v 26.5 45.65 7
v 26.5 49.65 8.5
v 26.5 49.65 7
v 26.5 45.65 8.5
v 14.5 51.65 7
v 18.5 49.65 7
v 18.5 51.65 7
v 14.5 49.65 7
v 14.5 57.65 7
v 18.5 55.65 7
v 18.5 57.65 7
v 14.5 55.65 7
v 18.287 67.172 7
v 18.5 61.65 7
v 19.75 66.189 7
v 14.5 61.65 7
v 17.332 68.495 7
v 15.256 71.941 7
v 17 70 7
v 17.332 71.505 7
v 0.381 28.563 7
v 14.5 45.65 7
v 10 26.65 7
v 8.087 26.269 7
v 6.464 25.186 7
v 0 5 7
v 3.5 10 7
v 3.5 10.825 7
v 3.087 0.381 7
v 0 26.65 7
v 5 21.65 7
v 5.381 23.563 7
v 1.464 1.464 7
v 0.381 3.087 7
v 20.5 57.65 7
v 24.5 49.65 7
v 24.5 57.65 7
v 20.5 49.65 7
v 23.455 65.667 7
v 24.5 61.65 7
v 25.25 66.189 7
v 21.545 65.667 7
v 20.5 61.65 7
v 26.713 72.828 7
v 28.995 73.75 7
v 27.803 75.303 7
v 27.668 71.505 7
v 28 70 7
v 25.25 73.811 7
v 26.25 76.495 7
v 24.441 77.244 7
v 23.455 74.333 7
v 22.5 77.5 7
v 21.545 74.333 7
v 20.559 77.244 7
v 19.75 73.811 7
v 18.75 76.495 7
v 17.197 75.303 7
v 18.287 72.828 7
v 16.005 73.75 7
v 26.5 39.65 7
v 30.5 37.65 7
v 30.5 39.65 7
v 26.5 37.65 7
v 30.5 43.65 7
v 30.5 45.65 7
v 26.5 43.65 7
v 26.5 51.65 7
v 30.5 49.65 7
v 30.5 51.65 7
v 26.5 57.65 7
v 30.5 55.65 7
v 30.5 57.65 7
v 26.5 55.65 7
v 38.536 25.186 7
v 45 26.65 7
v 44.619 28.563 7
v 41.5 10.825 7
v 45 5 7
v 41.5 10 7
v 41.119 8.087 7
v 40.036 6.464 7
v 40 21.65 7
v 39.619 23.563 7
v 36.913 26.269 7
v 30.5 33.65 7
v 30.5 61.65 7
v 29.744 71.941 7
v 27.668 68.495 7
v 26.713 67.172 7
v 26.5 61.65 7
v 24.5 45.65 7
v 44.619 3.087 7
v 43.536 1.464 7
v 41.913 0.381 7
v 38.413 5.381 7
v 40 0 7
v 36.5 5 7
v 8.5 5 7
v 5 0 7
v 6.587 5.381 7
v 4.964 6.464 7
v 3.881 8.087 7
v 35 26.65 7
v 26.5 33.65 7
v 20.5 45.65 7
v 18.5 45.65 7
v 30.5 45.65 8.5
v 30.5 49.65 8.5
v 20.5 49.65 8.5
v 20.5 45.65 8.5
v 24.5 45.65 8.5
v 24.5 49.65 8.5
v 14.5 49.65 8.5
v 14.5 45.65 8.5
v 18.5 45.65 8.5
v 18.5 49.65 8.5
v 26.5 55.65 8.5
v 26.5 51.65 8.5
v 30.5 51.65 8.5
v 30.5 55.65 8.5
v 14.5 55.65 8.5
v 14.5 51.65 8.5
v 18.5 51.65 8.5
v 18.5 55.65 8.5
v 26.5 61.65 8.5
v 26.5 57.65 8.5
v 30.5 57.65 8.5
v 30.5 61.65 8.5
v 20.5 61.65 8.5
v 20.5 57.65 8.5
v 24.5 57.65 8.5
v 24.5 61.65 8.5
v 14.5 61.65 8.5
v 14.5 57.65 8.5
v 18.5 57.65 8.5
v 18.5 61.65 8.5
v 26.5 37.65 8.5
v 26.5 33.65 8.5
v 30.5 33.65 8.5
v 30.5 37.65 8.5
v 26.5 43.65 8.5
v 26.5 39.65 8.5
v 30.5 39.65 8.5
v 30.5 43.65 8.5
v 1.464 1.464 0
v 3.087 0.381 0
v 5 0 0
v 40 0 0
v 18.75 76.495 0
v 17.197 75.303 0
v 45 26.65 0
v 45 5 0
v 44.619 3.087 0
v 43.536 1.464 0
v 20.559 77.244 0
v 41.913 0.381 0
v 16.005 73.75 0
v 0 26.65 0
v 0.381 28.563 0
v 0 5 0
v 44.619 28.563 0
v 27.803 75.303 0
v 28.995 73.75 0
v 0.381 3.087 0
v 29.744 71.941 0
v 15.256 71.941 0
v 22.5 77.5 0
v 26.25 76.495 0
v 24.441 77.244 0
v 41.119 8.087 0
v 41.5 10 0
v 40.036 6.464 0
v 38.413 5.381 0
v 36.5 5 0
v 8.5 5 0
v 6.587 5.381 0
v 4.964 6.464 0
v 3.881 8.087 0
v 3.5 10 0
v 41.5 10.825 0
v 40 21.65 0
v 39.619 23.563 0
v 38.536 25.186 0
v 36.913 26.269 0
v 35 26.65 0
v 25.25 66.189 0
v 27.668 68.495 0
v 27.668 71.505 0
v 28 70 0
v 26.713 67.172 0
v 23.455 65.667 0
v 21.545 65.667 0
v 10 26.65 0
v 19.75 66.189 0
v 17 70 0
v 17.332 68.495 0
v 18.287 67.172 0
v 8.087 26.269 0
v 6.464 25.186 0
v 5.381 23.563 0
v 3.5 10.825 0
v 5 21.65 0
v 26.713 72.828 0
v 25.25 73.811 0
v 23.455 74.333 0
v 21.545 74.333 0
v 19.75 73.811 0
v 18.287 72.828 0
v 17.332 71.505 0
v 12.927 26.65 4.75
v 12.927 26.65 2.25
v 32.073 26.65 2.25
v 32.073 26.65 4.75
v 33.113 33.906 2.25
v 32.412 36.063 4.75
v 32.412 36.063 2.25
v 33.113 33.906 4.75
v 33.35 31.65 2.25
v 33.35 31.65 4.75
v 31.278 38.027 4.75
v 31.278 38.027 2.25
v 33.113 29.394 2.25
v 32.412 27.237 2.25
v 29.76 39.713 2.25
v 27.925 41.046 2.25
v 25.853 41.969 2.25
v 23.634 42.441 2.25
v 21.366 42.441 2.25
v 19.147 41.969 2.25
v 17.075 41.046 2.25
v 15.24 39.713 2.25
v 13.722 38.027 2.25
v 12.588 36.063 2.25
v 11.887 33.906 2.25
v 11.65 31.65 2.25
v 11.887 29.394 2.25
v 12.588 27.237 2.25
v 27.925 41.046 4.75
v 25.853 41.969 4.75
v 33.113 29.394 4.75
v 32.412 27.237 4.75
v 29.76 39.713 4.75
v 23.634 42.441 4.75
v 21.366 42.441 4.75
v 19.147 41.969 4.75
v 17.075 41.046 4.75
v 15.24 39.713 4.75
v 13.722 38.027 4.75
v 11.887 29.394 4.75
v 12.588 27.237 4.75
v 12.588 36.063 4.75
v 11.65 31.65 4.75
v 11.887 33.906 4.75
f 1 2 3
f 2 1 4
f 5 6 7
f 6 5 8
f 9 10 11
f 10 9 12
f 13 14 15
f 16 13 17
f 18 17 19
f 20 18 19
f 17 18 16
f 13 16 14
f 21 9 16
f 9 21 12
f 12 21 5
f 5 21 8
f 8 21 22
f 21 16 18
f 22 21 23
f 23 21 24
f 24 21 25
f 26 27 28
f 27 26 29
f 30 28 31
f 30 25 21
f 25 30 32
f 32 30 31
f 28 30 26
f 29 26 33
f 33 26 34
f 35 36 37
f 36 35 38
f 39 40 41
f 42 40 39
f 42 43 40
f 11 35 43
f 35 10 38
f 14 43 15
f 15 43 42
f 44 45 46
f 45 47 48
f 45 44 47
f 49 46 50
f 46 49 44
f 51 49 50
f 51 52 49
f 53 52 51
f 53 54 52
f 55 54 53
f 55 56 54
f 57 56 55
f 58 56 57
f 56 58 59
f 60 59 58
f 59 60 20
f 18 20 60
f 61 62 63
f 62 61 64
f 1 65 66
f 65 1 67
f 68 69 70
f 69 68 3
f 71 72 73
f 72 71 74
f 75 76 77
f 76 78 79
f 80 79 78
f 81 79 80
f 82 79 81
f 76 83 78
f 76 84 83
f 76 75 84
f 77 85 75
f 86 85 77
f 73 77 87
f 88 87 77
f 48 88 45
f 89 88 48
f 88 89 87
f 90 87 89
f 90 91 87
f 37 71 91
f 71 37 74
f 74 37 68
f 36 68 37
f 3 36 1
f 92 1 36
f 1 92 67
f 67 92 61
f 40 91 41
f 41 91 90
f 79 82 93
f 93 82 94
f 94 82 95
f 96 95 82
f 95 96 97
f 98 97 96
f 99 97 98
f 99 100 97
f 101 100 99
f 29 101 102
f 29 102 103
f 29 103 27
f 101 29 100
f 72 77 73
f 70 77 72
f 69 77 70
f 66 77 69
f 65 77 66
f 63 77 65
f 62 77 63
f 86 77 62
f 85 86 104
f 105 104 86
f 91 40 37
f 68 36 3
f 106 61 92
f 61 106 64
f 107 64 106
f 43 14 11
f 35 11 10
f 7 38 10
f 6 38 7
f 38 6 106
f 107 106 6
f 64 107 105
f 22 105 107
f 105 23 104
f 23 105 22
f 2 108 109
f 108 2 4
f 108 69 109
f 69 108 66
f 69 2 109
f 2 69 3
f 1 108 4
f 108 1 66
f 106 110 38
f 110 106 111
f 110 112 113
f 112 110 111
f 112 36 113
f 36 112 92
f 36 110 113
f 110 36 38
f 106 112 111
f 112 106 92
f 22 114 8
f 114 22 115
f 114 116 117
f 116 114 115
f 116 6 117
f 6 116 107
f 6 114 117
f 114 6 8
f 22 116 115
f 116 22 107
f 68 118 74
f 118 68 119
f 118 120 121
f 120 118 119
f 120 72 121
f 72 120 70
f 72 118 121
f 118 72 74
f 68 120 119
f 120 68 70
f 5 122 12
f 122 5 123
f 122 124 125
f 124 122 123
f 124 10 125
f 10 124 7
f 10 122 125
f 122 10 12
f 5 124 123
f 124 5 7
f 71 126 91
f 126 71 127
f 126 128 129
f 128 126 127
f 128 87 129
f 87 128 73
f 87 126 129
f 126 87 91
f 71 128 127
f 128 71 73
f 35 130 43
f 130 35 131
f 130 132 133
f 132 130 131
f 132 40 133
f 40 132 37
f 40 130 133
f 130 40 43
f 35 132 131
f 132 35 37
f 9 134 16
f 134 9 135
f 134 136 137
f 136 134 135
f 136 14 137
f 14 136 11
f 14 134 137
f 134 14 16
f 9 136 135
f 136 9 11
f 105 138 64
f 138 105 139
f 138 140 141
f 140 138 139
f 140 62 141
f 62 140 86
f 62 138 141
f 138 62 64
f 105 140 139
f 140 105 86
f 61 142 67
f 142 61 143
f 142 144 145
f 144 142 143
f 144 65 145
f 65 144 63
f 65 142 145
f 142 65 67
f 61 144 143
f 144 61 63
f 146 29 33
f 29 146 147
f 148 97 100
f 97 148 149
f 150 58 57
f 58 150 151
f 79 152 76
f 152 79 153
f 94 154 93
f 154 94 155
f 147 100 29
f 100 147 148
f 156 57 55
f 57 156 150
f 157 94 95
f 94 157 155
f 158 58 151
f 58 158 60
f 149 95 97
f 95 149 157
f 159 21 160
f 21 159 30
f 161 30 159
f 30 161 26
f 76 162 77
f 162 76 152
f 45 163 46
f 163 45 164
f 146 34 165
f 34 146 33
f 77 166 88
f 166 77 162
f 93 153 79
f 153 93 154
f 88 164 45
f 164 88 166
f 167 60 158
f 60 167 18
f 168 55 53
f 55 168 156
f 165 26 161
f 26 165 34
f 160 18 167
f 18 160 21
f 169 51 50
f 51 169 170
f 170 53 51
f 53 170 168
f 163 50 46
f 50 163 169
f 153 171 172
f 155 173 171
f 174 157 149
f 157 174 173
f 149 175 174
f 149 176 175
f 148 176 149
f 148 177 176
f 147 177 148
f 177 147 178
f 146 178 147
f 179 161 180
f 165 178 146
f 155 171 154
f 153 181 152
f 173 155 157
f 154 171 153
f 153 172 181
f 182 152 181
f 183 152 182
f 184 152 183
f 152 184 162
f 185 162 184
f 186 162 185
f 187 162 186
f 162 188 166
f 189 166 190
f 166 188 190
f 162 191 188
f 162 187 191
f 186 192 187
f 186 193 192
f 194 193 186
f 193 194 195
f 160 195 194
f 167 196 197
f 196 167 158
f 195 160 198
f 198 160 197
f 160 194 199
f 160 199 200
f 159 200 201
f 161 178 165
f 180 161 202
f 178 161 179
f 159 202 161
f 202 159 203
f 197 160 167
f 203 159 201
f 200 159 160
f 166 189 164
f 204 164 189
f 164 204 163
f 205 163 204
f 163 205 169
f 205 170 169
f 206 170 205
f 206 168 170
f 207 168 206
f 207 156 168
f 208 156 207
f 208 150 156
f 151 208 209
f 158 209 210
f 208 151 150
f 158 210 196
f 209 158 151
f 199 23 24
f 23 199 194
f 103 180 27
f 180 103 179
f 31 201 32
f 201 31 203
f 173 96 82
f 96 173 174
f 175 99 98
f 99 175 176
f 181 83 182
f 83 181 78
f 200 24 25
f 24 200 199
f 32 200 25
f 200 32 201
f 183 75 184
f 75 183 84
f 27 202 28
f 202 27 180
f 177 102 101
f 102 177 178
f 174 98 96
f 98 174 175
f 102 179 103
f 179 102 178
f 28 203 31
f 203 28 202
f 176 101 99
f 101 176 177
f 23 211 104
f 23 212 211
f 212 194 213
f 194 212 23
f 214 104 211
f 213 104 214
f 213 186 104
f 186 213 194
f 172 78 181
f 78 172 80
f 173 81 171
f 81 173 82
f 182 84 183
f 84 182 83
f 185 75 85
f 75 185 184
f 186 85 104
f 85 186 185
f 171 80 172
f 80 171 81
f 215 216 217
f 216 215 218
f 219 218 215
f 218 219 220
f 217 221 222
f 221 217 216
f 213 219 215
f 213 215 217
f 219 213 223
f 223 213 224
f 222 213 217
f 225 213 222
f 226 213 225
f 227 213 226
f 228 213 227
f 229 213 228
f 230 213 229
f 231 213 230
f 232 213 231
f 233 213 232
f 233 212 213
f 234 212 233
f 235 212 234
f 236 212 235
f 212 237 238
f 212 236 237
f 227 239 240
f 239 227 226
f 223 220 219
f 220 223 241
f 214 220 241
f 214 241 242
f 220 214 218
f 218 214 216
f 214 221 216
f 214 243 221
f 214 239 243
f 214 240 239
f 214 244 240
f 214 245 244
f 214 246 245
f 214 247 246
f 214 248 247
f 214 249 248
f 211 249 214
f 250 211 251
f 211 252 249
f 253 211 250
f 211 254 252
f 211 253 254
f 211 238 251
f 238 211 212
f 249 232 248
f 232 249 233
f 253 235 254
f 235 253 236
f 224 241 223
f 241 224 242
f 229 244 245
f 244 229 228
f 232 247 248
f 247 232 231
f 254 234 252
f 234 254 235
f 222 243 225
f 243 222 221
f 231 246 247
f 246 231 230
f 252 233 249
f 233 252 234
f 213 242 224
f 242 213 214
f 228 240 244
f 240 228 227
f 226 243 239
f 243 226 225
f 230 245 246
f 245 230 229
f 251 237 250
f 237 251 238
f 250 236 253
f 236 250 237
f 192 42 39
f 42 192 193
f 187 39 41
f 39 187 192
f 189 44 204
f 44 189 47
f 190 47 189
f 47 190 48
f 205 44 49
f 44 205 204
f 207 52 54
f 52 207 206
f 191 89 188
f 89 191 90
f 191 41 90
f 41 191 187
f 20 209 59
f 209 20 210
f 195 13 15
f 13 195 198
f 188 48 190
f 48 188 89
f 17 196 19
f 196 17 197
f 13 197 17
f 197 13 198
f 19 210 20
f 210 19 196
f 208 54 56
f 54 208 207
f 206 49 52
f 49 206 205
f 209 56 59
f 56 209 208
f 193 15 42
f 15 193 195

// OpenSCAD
/**
 * Coin bottle opener
 * Designed by Niek Blankers <niek@niekproductions.com>
 * 
 * Set fill to 90-100% for best results.
 * Insert coin during printing!
 * 
 */

/**
 * 5 cent euro coin:
 * Diameter: 21.3
 * Thickness: 1.7
 *
 * 10 cent euro coin:
 * Diameter: 19.8 
 * Thickness: 2.0
 *
 * 20 cent euro coin:
 * Diameter: 22.3
 * Thickness: 2.2
 *
 * 50 cent euro coin:
 * Diameter: 24.3
 * Thickness: 2.4
 * 
 * US penny:
 * Diameter: 19.1
 * Thickness: 1.6
 *
 * US nickel:
 * Diameter: 21.2
 * Thickness: 2.0
 *
 * US dime:
 * Diameter: 17.9
 * Thickness: 1.4
 *
 * US quarter:
 * Diameter: 24.3
 * Thickness: 1.8
 *
 * US 50 cent:
 * Diameter: 30.6
 * Thickness: 2.2
 */

// Coin diameter
coinDiameter = 21.3; // [21.3:0.05 euro, 19.8:0.10 euro, 22.3:0.20 euro, 24.3:0.50 euro, 19.1:US penny, 21.2:US nickel, 17.9:US dime, 24.3:US quarter, 30.6:US 50 cent]

// Coin thickness
coinThickness = 1.7; // [1.7:0.05 euro, 2.0:0.10 euro, 2.2:0.20 euro, 2.4:0.50 euro, 1.6:US penny, 2.0:US nickel, 1.4:US dime, 1.8:US quarter, 2.2:US 50 cent]

// Coin clearance
coinClearance = 0.4;

// Coin offset from center
coinOffset = 5; // [0:10]

// Coin angle
coinAngle = 0; // [0:15]

// Opener width
width=45; // [40:100]

// Opener length
length=85; // [65:100]

// Opener height
height=7; // [5:20]

// Front opener width
frontWidth=45; // [45:105]

// Back opener width
backWidth = 15; // [10:100]

// Edge width
edgeWidth=5; // [2:20]

// Edge round radius
roundRadius=5; // [0:10]

// Logo cube size (WxLxH)
cubeSize = [4,4,1.5];

// Logo cube spacing
cubeSpacing = 6; // [1:10]

// For the Bitmap
bits=[
	[1,0,0],
	[1,0,0],
	[1,1,1],
	[1,0,1],
	[1,1,1]
];

openingWidth=width-(edgeWidth*2);
openingLength=16-coinOffset+coinDiameter/2;
openingHeight=height;
frontOpeningWidth=openingWidth+3;

frontLength = openingLength+edgeWidth*2;

chainHole = backWidth-4; //Keychain hole diameter

module handle(){
		hull(){
				translate([-(frontWidth-width)/2,0,0]) roundedRect([frontWidth,frontLength/2,height], roundRadius);
				translate([0,frontLength/2,0]) roundedRect([width,frontLength/2,height], roundRadius);
				translate([width/2,length-backWidth,height/2]) cylinder(h=height, r=backWidth/2, center=true);
		}
}

module opener(){
	difference(){
		union(){
			handle();
			translate([width/2 + (cubeSpacing*((len(bits[1])-1)/2)),frontLength + (length-frontLength)/((length-frontLength)/cubeSize[1]),height+cubeSize[2]/2]) rotate(a=[0,0,180]) drawBitmap(bits, cubeSpacing, cubeSize);
		}

		translate([(width/2)-(openingWidth/2),edgeWidth,-1]) hull(){
			translate([-(frontOpeningWidth-openingWidth)/2,0,0]) roundedRect([frontOpeningWidth,openingLength/2,openingHeight+2], roundRadius);
			translate([0,openingLength/2,0]) roundedRect([openingWidth,openingLength/2,openingHeight+2], roundRadius);
		}

		translate([width/2,edgeWidth+openingLength+coinOffset,height/2]) rotate(a=-coinAngle,v=[1,0,0]){
			cylinder(h = coinThickness+coinClearance*2, r = (coinDiameter+coinClearance)/2, center = true);
		}

		translate([width/2,length-backWidth,height/2]) scale([1.0,0.8,1.0]) cylinder(h=height+1, r=chainHole/2, center=true);

	}	

}

opener();


module roundedRect(size, radius) { // from http://www.thingiverse.com/thing:9347/#comments
	x = size[0];
	y = size[1];
	z = size[2];
	
	linear_extrude(height=z)
		hull() {
			translate([radius, radius, 0])
			circle(r=radius);
	
			translate([x - radius, radius, 0])
			circle(r=radius);
	
			translate([x - radius, y - radius, 0])
			circle(r=radius);
	
			translate([radius, y - radius, 0])
			circle(r=radius);
	}
}

/**
 * drawBitmap module
 * By Niek Blankers <niek@niekproductions.com>
 *
 * @param	array		bits			Bitmap array
 * @param	decimal	cubeSpacing	
 * @param	decimal	cubeSize
 *
 * Example:
 *
	bits=[
	[1,0,0,1,0,1,0,1,1,1,0,1,0,0,1],
	[1,1,0,1,0,1,0,1,0,0,0,1,0,1,0],
	[1,0,1,1,0,1,0,1,1,0,0,1,1,0,0],
	[1,0,0,1,0,1,0,1,0,0,0,1,0,1,0],
	[1,0,0,1,0,1,0,1,1,1,0,1,0,0,1]
	];
	cubeSize = 4;
	cubeSpacing = 5;

	drawBitmap(bits, cubeSpacing, cubeSize);
 *
 */

module drawBitmap(bits, cubeSpacing, cubeSize){
	rotate(a=180, v=[1,0,0]){
		for(i=[0:len(bits)-1]){
			translate([0,i*cubeSpacing,0]){
				for(x=[0:len(bits[i])-1]){
					translate([x*cubeSpacing,0,0]) cube(size = bits[i][x]*cubeSize, center = true);
				}
			}
		}
	}
}
